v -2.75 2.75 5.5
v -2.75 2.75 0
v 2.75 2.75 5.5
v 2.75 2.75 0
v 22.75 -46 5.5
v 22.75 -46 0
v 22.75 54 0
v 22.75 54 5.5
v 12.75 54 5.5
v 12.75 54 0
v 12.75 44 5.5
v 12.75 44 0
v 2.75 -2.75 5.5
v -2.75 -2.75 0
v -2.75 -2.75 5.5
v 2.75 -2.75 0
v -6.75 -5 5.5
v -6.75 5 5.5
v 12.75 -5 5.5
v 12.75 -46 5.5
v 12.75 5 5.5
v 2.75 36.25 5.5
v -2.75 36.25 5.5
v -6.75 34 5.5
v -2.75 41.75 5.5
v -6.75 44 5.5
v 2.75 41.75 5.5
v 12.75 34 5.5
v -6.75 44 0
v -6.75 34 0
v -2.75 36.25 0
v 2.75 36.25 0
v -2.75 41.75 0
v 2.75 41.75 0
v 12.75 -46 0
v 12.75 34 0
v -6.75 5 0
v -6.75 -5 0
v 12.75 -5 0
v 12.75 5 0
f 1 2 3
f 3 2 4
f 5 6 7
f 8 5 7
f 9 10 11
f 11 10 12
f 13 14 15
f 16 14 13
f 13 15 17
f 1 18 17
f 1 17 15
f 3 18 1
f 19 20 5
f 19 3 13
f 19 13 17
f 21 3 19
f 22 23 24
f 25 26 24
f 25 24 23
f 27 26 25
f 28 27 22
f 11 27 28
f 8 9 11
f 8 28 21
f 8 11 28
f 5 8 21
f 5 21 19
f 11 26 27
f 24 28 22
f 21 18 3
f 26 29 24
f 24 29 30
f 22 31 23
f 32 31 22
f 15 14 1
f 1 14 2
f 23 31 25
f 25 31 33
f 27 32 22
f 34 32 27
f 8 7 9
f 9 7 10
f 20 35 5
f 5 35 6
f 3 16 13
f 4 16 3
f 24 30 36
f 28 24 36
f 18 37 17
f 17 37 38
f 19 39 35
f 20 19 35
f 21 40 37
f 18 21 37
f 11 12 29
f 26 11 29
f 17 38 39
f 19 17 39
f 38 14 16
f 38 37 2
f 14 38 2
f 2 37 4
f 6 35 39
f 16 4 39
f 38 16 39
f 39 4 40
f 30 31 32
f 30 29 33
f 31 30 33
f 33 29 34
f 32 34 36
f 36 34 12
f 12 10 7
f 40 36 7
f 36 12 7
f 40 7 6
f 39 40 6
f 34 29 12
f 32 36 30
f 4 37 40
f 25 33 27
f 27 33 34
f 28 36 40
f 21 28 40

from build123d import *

# Parameters (mm, degrees)
SKETCH_1_W      = 5.5
SKETCH_1_H      = 5.5
EXTRUDE_1_DEPTH = 5.5


with BuildPart() as part:
    # ｽｹｯﾁ1 → ﾎﾞｽ - 押し出し1 (new body)
    with BuildSketch(Plane.XY):
        Polygon((-6.75, 5), (-6.75, -5), (12.75, -5), (12.75, -46), (22.75, -46), (22.75, 54), (12.75, 54), (12.75, 44), (-6.75, 44), (-6.75, 34), (12.75, 34), (12.75, 5), align=None)
        Rectangle(SKETCH_1_W, SKETCH_1_H, mode=Mode.SUBTRACT)
        with Locations((0, 39)):
            Rectangle(SKETCH_1_W, SKETCH_1_H, mode=Mode.SUBTRACT)
    extrude(amount=EXTRUDE_1_DEPTH)


solid = part.part
